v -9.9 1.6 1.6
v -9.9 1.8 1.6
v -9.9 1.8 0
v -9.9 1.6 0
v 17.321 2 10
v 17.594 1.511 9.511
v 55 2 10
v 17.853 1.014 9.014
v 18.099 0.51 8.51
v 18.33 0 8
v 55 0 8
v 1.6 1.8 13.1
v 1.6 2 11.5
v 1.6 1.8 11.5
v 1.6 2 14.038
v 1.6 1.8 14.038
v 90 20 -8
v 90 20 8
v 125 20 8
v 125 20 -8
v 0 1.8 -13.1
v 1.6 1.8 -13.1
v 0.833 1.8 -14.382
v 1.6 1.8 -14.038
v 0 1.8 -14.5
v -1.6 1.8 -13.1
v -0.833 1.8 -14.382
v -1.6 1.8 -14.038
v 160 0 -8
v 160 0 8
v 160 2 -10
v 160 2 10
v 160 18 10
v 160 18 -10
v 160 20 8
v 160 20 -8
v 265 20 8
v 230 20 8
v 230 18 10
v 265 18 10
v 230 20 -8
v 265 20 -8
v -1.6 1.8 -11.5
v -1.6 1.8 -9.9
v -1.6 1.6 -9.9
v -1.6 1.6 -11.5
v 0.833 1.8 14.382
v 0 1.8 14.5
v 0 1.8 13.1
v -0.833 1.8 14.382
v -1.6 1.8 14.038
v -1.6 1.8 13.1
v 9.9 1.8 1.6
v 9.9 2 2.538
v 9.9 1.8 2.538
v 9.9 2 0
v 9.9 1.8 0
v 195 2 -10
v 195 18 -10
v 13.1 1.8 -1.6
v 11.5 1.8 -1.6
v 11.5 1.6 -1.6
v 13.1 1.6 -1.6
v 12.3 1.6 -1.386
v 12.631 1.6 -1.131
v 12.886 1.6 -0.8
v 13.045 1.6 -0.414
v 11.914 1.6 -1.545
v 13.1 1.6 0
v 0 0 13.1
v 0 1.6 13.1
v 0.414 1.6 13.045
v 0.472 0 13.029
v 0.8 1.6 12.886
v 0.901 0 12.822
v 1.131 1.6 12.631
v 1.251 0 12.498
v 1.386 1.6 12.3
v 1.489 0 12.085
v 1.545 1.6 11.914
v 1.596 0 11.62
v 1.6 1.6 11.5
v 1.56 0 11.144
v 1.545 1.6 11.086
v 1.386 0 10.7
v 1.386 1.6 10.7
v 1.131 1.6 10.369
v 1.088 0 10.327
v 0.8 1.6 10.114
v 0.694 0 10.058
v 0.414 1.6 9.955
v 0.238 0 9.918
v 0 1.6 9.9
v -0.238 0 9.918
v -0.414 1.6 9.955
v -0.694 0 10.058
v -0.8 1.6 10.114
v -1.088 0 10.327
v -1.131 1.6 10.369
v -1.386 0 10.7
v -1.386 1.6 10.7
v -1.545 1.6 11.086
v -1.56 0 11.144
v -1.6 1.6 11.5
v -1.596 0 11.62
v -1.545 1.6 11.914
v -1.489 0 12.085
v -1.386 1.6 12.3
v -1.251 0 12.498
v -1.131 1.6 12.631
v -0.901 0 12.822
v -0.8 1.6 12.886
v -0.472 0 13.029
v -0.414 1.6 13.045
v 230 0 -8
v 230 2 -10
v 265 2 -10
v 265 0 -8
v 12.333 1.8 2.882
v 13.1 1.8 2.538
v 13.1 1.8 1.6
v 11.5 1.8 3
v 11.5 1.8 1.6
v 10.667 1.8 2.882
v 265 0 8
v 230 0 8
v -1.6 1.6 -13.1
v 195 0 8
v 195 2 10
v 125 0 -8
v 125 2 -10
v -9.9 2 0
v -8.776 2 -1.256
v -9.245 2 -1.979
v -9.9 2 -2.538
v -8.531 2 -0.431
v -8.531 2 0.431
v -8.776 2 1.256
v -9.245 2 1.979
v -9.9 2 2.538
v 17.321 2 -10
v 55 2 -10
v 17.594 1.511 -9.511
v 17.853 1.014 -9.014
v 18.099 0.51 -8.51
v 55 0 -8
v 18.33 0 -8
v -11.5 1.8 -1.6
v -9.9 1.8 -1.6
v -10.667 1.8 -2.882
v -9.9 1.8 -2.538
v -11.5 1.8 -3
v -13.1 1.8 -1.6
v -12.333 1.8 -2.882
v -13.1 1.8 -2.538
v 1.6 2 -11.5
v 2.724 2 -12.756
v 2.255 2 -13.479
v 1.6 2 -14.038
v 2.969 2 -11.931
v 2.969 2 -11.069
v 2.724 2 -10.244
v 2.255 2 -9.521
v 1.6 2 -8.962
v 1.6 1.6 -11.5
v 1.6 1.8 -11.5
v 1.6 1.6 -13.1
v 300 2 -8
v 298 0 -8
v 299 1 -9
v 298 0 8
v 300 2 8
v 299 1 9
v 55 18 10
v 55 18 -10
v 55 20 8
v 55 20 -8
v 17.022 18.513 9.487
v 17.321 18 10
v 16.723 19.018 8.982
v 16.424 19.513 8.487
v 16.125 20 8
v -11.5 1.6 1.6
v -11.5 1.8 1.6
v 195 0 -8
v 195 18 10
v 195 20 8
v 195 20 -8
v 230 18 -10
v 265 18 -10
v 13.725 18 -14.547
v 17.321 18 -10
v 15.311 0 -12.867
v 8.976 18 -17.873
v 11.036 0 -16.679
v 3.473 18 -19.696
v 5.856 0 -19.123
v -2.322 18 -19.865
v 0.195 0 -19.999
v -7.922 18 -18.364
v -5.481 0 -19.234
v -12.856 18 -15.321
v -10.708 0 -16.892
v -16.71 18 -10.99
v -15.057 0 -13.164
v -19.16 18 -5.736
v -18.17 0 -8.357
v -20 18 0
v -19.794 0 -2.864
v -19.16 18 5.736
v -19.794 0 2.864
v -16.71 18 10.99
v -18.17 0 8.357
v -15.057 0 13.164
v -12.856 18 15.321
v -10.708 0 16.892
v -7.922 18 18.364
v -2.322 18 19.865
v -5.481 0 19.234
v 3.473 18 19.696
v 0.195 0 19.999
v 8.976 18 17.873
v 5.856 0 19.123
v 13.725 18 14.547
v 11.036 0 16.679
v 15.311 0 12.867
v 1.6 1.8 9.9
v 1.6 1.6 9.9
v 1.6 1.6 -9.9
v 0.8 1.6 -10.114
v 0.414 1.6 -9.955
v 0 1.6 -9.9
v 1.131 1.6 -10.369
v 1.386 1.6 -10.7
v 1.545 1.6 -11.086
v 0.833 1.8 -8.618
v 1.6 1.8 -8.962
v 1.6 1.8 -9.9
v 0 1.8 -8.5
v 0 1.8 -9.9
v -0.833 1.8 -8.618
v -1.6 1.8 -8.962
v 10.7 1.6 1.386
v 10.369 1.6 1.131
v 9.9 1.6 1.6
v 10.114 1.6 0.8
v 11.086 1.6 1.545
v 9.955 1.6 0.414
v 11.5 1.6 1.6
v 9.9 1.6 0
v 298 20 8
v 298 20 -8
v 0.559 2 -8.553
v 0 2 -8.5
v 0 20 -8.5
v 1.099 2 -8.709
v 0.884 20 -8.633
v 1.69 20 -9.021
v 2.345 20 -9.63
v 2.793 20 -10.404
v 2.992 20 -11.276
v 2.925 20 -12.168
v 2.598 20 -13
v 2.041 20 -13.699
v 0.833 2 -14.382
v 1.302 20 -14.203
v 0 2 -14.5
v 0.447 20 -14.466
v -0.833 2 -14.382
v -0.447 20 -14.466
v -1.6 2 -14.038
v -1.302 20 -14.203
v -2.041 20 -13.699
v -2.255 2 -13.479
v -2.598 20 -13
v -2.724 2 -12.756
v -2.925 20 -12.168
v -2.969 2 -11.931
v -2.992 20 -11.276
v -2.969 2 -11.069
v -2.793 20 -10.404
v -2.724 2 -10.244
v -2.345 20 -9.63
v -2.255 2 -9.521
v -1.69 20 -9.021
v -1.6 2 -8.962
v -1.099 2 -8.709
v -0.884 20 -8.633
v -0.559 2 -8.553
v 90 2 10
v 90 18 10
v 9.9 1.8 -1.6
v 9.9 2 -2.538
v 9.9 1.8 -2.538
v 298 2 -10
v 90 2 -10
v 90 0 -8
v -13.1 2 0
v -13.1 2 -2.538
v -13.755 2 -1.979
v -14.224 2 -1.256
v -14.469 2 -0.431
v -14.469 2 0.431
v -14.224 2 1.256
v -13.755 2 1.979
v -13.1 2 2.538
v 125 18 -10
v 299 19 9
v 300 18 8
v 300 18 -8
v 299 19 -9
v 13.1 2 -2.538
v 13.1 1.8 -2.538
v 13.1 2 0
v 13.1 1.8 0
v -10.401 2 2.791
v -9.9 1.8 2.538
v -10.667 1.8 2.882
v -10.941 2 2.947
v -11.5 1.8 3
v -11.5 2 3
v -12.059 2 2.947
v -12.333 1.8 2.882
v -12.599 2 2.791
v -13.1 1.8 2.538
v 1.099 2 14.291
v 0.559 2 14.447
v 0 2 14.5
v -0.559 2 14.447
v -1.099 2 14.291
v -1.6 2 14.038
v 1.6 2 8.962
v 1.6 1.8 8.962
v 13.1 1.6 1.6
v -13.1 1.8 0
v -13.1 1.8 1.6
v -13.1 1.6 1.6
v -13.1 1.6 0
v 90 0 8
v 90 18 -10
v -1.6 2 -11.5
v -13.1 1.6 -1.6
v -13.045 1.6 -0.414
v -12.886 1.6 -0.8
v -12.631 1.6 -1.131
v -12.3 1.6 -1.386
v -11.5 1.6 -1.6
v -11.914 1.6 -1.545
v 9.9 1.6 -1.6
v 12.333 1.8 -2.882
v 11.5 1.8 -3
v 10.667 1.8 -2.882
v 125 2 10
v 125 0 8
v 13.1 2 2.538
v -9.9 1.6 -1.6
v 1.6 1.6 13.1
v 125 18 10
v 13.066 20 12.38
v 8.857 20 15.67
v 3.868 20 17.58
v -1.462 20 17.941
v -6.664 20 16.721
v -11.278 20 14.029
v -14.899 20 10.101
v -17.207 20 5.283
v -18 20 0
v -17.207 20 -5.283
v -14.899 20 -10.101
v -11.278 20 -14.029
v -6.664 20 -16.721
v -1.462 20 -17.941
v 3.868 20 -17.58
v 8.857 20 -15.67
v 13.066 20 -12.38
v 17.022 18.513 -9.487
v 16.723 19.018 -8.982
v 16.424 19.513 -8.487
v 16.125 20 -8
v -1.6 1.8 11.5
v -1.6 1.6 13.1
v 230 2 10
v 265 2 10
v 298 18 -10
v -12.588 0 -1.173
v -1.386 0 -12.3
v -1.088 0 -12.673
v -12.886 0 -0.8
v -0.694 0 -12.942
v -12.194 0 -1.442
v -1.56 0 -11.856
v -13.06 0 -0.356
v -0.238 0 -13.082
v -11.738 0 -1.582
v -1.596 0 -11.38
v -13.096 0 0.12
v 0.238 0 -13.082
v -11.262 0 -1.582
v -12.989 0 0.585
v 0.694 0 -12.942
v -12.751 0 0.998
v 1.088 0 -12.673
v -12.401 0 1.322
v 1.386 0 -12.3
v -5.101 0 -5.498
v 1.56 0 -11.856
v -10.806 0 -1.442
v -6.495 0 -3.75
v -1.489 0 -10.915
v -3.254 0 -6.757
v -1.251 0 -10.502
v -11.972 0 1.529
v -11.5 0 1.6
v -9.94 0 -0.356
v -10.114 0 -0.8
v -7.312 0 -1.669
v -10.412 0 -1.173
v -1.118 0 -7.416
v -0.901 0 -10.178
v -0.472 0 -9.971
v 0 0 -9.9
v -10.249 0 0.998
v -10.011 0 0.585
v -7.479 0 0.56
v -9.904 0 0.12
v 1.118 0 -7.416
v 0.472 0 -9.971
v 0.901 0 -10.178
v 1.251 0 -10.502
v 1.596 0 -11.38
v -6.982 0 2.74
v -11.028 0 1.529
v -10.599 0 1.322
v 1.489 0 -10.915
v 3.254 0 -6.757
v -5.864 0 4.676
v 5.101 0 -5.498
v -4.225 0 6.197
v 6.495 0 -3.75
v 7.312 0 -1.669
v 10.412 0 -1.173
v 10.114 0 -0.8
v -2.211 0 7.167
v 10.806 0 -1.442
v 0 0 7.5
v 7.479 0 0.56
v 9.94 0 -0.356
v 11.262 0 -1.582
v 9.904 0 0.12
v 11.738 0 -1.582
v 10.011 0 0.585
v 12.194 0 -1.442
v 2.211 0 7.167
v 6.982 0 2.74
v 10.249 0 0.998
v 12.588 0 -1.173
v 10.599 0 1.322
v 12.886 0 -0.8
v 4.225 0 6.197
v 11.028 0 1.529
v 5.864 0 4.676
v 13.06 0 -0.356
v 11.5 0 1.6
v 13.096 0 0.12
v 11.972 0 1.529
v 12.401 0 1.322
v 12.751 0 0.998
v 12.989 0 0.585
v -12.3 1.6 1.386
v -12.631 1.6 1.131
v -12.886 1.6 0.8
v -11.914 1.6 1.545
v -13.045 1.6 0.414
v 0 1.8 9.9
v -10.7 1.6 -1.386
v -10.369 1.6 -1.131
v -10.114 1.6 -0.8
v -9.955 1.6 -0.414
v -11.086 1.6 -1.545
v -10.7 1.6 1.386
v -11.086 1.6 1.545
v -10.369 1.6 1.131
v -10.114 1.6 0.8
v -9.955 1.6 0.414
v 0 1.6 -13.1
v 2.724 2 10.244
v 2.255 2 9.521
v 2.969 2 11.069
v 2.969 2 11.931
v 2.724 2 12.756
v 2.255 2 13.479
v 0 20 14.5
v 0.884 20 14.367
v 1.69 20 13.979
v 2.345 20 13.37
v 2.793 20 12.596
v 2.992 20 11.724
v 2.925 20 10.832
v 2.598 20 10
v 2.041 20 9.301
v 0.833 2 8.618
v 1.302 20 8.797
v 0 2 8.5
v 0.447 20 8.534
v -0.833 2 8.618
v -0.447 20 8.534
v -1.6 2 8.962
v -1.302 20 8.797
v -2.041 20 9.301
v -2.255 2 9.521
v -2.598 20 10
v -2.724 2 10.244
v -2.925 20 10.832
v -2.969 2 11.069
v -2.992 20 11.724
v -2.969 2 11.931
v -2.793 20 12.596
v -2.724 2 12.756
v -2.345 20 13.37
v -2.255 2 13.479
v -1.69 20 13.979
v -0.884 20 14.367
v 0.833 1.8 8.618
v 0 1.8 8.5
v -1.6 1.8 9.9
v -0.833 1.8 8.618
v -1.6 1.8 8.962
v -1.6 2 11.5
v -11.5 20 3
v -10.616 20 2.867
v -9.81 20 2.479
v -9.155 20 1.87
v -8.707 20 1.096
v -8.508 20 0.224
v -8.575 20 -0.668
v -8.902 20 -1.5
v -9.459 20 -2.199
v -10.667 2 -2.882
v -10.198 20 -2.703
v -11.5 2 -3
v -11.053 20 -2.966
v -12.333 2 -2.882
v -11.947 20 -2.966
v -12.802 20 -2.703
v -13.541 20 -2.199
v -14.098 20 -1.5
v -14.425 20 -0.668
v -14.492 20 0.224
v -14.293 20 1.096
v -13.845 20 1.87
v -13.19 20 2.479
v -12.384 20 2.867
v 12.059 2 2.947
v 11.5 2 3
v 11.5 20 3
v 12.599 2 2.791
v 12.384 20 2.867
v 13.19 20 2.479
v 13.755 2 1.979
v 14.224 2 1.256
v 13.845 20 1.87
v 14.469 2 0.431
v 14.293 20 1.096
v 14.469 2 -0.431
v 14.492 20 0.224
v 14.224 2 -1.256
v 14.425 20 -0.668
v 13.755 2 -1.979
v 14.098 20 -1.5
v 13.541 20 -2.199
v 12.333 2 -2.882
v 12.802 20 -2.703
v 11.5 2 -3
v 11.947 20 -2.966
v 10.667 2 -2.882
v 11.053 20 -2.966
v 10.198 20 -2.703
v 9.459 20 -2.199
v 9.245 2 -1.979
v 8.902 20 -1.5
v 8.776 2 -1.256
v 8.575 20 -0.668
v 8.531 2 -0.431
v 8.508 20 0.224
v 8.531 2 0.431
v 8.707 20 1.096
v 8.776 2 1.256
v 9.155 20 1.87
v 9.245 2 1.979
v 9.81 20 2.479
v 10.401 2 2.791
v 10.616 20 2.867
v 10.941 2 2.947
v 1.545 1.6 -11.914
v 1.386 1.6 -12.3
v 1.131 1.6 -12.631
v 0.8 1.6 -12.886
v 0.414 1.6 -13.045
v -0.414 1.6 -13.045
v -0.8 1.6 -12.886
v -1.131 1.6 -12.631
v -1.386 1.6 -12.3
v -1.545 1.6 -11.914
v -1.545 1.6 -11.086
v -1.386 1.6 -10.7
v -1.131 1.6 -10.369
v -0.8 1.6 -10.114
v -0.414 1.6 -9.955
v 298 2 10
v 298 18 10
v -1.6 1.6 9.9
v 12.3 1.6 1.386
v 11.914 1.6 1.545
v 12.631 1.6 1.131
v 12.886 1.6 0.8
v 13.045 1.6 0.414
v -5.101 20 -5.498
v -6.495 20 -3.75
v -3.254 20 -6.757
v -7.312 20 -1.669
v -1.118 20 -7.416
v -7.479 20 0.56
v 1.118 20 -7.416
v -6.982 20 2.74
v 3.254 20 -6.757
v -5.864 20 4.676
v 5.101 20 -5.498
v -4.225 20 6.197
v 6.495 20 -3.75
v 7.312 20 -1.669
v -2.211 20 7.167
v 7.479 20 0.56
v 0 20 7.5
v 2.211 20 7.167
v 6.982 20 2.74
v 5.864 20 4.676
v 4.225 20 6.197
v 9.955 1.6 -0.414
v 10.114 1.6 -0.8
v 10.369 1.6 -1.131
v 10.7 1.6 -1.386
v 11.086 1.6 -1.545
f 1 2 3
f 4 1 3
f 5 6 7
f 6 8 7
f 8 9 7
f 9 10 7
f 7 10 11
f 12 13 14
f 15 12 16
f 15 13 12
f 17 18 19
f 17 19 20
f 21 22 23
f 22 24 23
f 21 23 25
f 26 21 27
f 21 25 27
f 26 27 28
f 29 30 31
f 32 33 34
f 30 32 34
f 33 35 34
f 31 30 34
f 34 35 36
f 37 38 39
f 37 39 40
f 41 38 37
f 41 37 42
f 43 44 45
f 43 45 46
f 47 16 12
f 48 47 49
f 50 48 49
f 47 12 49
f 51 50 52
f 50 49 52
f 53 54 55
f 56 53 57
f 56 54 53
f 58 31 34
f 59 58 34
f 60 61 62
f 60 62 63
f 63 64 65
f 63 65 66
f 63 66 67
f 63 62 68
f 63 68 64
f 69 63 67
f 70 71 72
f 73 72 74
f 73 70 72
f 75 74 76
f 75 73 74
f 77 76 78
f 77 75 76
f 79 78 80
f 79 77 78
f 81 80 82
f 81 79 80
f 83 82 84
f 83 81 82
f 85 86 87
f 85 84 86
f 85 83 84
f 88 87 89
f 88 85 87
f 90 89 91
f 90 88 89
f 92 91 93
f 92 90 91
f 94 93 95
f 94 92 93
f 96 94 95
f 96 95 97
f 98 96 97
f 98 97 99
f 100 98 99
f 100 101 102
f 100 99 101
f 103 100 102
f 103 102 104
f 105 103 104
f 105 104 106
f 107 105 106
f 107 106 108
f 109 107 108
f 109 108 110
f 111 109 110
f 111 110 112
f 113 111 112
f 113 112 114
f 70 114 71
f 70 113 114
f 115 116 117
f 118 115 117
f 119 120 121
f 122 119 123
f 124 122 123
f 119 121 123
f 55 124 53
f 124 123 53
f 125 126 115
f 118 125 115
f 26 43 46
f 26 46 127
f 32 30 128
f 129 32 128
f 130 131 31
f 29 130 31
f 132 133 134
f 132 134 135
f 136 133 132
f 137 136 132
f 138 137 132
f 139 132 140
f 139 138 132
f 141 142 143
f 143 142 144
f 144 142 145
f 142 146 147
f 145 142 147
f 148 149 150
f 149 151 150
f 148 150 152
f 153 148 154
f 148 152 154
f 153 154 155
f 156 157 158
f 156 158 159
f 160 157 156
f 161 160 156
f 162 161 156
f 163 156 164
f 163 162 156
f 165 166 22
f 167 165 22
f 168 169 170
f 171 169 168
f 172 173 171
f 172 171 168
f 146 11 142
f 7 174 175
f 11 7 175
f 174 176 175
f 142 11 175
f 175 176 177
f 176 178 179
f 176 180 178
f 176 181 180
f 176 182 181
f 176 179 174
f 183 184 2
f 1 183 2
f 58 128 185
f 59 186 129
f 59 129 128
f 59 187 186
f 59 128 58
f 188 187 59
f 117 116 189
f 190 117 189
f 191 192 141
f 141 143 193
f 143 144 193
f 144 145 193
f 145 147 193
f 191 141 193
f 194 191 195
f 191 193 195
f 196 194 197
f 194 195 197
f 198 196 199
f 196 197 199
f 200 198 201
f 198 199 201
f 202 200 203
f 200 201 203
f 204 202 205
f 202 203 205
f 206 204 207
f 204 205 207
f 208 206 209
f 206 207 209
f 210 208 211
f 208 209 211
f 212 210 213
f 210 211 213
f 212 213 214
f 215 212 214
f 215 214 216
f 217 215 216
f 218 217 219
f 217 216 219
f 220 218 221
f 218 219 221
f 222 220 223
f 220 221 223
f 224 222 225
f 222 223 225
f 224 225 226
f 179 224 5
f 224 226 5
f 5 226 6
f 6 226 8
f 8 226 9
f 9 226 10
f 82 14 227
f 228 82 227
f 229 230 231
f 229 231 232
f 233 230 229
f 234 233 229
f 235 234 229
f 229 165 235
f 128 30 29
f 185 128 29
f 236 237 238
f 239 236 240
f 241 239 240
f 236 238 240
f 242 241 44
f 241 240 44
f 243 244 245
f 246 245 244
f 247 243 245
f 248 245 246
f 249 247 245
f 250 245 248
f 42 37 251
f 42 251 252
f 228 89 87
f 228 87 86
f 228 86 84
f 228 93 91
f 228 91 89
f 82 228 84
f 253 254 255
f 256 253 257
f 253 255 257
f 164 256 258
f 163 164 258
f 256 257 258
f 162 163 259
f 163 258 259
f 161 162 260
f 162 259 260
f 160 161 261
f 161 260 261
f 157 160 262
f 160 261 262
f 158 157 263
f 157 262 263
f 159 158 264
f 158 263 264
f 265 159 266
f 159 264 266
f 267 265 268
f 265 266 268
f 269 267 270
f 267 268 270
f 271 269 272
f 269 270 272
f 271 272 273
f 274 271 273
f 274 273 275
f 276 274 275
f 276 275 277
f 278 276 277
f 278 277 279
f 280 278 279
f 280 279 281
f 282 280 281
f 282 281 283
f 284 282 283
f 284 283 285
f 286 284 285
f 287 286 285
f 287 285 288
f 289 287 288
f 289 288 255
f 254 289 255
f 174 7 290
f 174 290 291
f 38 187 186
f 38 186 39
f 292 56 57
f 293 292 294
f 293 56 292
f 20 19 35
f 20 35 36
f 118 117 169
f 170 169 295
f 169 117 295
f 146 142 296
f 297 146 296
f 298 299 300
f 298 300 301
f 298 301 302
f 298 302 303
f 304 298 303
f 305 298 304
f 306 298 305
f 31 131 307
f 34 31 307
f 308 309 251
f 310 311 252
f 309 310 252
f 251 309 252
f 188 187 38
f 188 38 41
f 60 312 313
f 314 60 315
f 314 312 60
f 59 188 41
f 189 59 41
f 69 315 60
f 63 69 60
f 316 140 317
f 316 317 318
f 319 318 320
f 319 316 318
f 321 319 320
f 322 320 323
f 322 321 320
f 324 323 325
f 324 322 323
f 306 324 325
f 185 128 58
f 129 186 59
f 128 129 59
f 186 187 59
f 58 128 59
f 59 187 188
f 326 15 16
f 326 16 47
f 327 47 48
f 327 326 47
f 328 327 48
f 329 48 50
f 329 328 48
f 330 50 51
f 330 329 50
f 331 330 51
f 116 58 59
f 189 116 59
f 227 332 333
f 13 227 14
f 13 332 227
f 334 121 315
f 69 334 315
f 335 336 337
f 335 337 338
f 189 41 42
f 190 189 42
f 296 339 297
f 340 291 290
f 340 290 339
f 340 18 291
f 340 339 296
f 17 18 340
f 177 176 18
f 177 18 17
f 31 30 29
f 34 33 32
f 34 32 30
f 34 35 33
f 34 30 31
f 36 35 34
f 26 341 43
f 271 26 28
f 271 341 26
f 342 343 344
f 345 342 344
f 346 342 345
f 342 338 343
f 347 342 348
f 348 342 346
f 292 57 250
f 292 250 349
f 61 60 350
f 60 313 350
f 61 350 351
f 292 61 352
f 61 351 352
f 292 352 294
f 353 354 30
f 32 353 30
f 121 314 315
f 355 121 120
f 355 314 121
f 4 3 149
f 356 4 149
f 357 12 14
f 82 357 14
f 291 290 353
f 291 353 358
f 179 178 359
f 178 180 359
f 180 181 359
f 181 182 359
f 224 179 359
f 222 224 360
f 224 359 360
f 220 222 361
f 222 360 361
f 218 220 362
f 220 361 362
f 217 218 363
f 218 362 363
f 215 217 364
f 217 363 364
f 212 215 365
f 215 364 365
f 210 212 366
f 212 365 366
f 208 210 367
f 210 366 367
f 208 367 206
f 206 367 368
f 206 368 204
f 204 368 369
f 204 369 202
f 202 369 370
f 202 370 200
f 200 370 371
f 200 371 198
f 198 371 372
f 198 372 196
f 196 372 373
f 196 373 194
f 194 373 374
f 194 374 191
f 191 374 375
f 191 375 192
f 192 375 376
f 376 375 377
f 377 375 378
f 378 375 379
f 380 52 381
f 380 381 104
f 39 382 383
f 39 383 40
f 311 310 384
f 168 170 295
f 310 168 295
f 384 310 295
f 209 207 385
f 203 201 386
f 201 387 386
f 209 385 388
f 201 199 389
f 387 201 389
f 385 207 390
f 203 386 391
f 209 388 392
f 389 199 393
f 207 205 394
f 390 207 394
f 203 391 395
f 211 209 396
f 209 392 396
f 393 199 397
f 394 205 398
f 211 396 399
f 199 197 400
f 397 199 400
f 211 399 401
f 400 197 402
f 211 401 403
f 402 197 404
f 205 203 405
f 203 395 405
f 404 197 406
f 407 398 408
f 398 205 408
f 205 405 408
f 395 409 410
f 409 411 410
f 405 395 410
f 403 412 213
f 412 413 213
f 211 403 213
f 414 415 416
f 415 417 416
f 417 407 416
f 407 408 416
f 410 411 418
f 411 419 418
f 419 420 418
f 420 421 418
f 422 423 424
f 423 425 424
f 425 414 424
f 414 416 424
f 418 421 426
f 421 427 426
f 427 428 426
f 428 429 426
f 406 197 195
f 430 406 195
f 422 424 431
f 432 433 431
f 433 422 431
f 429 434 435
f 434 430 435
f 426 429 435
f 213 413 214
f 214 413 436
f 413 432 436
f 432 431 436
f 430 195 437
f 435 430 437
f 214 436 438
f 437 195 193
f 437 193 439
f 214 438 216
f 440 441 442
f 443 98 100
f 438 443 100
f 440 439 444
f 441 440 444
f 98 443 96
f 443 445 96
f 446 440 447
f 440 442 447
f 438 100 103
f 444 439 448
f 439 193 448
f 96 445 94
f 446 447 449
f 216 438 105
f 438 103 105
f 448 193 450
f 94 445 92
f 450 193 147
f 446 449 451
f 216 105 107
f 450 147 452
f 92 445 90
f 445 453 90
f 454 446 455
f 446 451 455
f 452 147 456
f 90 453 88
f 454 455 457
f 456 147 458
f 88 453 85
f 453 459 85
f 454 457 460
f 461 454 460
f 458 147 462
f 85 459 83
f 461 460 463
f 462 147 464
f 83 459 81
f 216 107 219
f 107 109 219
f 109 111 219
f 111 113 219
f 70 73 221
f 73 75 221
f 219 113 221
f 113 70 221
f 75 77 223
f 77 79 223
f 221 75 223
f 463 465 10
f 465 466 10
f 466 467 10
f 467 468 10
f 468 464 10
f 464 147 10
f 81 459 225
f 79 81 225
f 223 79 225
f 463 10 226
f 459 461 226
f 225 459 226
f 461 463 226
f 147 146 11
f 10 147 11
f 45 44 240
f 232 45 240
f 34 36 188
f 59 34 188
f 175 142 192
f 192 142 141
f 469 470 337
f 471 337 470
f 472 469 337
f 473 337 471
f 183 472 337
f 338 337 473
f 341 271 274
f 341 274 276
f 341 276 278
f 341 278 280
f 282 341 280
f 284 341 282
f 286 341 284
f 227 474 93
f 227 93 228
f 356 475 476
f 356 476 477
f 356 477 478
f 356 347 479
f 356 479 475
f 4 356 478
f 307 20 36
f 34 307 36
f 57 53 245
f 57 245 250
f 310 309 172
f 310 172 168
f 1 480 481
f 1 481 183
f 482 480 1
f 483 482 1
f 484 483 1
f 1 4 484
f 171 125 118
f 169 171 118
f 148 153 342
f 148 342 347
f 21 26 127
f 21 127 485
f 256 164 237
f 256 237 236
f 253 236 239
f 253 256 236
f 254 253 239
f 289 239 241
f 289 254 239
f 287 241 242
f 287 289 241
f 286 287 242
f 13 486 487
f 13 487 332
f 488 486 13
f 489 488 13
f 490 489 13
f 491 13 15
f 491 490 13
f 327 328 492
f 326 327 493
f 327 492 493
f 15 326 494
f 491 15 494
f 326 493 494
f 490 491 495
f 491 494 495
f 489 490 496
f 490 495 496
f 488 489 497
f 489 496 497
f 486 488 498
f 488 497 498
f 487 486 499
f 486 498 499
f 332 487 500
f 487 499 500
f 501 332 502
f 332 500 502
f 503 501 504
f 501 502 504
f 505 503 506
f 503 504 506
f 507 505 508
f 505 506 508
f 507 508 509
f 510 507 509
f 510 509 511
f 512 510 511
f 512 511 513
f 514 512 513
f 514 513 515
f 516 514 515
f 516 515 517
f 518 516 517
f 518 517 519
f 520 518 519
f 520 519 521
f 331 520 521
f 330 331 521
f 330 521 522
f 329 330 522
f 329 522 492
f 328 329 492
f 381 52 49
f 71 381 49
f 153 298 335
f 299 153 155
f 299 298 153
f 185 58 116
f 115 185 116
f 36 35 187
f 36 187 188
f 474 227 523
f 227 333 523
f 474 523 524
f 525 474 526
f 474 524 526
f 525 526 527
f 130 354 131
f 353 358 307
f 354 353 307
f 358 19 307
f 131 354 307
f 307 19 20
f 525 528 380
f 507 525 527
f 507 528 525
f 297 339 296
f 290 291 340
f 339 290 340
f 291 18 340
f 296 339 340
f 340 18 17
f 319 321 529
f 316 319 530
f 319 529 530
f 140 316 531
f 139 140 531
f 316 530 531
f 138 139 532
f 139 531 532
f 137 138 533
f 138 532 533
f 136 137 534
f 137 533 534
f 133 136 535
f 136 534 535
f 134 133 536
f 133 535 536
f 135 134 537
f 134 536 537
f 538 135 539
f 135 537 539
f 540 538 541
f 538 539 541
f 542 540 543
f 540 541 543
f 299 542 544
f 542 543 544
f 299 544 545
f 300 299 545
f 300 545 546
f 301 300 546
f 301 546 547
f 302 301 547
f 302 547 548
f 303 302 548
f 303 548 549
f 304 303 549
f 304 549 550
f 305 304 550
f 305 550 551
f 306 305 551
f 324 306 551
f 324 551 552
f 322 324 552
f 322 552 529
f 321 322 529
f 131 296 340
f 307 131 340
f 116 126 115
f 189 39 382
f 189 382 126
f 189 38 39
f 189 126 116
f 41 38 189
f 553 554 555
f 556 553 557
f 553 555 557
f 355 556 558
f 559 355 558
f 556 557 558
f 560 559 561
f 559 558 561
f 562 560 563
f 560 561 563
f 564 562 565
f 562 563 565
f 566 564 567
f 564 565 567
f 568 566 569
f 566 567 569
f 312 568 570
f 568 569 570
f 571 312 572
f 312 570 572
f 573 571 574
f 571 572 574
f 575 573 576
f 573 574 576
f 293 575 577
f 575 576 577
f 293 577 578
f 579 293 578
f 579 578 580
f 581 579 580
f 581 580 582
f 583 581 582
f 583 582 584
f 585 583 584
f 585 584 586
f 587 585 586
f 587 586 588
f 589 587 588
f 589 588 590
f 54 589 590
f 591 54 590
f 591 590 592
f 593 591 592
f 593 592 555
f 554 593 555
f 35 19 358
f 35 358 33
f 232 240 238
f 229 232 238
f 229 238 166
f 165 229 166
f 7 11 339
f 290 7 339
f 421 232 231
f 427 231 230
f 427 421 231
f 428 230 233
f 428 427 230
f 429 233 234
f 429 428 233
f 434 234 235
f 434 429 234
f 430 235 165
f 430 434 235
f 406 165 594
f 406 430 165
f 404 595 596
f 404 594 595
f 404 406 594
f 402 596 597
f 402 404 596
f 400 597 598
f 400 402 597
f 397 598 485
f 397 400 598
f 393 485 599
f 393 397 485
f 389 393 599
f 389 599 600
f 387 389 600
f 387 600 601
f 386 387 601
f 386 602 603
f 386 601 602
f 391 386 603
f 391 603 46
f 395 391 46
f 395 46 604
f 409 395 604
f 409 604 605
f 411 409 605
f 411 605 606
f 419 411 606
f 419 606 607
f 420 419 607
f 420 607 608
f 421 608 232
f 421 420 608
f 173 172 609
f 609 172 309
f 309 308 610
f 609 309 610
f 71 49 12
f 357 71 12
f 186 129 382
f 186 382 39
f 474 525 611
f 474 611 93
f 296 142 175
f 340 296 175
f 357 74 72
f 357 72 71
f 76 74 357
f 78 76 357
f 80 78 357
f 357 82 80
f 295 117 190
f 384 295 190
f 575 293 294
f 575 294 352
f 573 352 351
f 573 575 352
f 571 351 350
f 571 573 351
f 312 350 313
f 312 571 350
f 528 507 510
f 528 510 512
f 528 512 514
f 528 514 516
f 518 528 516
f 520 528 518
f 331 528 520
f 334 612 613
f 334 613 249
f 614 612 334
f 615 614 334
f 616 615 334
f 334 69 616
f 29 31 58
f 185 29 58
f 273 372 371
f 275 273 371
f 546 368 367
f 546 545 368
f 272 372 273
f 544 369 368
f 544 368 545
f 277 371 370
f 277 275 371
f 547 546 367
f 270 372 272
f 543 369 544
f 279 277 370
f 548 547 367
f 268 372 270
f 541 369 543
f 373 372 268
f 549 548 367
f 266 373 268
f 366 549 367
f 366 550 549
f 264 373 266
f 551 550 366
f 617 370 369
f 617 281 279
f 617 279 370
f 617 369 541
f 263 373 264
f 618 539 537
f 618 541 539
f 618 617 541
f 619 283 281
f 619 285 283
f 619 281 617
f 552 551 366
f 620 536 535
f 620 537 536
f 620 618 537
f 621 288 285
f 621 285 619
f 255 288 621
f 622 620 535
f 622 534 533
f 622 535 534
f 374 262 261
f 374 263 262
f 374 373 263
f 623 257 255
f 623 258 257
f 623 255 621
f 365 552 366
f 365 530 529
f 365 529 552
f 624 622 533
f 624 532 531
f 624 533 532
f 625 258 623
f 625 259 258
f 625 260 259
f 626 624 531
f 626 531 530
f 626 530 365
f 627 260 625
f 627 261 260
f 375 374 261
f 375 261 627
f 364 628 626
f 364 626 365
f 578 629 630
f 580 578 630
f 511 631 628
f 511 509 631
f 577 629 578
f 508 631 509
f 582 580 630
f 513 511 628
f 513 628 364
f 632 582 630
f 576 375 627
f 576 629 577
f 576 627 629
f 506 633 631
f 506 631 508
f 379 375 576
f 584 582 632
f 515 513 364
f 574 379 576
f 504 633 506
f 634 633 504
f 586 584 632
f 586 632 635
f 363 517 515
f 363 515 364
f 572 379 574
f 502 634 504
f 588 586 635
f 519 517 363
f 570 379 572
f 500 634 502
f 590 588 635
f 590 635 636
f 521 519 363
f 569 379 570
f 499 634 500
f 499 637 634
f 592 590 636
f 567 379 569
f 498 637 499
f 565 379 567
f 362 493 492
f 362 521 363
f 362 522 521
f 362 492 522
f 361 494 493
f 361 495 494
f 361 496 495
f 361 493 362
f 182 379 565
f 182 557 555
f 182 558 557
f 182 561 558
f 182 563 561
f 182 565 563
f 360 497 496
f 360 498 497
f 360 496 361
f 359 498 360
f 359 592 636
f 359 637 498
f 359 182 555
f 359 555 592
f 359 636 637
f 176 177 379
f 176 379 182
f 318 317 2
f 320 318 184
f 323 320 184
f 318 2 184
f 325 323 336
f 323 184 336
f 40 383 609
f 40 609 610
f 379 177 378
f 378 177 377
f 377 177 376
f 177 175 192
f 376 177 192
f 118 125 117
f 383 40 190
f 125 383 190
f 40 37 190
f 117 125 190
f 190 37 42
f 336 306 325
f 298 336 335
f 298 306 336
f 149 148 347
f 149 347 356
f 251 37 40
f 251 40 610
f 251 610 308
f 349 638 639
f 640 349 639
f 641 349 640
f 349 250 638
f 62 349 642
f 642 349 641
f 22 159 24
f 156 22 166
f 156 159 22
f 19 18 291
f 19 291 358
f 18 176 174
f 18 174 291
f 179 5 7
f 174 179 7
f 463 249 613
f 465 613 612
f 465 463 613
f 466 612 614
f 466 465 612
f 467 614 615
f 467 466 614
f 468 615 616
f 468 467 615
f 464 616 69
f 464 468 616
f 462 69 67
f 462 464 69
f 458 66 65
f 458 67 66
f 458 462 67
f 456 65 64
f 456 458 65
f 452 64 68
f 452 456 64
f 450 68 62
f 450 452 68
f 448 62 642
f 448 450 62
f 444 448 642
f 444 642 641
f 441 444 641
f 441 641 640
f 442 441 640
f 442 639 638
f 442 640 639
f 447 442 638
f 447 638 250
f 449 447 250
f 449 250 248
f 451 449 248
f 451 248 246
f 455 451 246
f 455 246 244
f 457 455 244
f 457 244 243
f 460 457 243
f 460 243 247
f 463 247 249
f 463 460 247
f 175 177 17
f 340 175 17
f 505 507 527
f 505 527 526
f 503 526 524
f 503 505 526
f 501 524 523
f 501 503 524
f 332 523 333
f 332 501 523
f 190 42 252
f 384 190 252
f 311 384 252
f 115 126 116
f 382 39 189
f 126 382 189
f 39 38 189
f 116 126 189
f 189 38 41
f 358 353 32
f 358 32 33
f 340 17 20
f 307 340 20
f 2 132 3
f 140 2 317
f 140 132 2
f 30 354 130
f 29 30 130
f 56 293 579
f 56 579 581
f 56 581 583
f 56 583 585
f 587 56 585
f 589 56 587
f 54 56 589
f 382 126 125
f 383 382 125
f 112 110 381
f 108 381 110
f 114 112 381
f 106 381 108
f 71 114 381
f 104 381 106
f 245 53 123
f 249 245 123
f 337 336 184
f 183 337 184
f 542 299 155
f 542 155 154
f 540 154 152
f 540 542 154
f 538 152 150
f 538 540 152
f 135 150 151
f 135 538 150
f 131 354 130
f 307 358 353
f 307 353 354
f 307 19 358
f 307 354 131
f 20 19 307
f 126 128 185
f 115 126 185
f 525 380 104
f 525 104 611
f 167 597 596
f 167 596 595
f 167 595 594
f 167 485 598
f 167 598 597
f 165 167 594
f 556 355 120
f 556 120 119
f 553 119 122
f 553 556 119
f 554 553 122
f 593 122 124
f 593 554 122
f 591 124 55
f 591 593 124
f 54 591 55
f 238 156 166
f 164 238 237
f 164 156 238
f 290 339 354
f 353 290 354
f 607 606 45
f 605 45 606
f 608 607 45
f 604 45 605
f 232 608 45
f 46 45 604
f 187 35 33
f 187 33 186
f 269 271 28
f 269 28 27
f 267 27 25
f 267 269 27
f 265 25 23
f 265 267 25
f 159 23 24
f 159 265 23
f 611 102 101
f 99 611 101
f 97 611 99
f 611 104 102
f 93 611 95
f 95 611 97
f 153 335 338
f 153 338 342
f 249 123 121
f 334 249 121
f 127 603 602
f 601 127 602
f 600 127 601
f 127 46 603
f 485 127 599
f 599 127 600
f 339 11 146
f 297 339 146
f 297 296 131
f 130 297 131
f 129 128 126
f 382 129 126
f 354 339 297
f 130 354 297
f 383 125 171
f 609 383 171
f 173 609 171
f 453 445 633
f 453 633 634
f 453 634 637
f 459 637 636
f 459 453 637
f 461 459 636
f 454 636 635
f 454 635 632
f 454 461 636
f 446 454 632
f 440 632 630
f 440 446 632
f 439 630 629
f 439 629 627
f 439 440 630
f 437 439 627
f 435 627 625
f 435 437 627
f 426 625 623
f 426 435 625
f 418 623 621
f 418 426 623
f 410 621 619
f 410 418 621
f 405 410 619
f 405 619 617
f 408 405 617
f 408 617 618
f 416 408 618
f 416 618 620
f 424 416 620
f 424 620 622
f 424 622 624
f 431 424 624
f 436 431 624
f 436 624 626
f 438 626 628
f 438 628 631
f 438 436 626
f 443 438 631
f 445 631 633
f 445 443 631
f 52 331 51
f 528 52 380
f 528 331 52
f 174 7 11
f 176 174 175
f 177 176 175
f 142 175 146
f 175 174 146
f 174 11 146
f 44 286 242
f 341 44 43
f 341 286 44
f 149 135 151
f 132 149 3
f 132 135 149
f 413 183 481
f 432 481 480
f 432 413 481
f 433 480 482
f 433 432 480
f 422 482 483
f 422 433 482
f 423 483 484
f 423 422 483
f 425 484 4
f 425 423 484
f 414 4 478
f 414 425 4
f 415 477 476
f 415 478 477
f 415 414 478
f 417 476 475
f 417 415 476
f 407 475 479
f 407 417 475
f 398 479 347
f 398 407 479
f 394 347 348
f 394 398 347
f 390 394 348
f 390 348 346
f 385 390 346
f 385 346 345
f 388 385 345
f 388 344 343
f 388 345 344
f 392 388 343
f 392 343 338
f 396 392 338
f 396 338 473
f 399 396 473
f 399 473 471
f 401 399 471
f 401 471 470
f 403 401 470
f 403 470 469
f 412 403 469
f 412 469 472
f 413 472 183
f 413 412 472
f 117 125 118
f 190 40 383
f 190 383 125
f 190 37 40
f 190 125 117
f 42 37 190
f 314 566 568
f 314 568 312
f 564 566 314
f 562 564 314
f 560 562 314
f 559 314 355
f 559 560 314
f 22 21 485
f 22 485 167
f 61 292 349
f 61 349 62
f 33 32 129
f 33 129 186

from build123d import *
from build123d.topology import SkipClean

# Parameters (mm, degrees)
SKETCH1_R           = 20
SKETCH1_R_2         = 7.5
SKETCH1_R_3         = 1.6
BOSS_EXTRUDE1_DEPTH = 20
SKETCH2_R           = 3
CUT_EXTRUDE2_DEPTH  = 18
BOSS_EXTRUDE2_START = -20
BOSS_EXTRUDE2_DEPTH = 20
SKETCH4_W           = 20
SKETCH4_H           = 20
BOSS_EXTRUDE3_DEPTH = 35
LPATTERN1_COUNT     = 7
LPATTERN1_PITCH     = 35
CHAMFER2_SIZE       = 2
CHAMFER3_SIZE       = 2
CHAMFER4_SIZE       = 2
CHAMFER5_SIZE       = 2
CHAMFER6_SIZE       = 2
CHAMFER7_SIZE       = 2
CHAMFER8_SIZE       = 2
CHAMFER9_SIZE       = 2
CHAMFER10_SIZE      = 2
CUT_EXTRUDE3_DEPTH  = 0.2
SKETCH6_W           = 3.2
SKETCH6_H           = 3.2
CUT_EXTRUDE4_DEPTH  = 0.2


with BuildPart() as part:
    # Sketch1 → Boss-Extrude1 (new body)
    with BuildSketch(Plane(origin=(0, 0, 0), x_dir=(1, 0, 0), z_dir=(0, 1, 0))):
        with Locations(Location((0, 0, 0), (0, 0, 270))):
            Circle(SKETCH1_R)
        with Locations(Location((0, 0, 0), (0, 0, 270))):
            Circle(SKETCH1_R_2, mode=Mode.SUBTRACT)
        with Locations(Location((0, 11.5, 0), (0, 0, 270))):
            Circle(SKETCH1_R_3, mode=Mode.SUBTRACT)
        with Locations(Location((11.5, 0, 0), (0, 0, 270))):
            Circle(SKETCH1_R_3, mode=Mode.SUBTRACT)
        with Locations(Location((0, -11.5, 0), (0, 0, 270))):
            Circle(SKETCH1_R_3, mode=Mode.SUBTRACT)
        with Locations(Location((-11.5, 0, 0), (0, 0, 270))):
            Circle(SKETCH1_R_3, mode=Mode.SUBTRACT)
    extrude(amount=BOSS_EXTRUDE1_DEPTH)

    # Sketch2 → Cut-Extrude2 (cut)
    with BuildSketch(Plane(origin=(0, 20, 0), x_dir=(1, 0, 0), z_dir=(0, 1, 0))):
        with Locations(Location((0, 11.5, 0), (0, 0, 270))):
            Circle(SKETCH2_R)
        with Locations(Location((11.5, 0, 0), (0, 0, 270))):
            Circle(SKETCH2_R)
        with Locations(Location((0, -11.5, 0), (0, 0, 270))):
            Circle(SKETCH2_R)
        with Locations(Location((-11.5, 0, 0), (0, 0, 270))):
            Circle(SKETCH2_R)
    extrude(amount=-CUT_EXTRUDE2_DEPTH, mode=Mode.SUBTRACT)

    # Sketch3 → Boss-Extrude2 (add)
    with BuildSketch(Plane(origin=(0, 20, 0), x_dir=(1, 0, 0), z_dir=(0, 1, 0)).offset(BOSS_EXTRUDE2_START)):
        with BuildLine():
            Line((55, -10), (55, 10))
            Line((55, 10), (17.320508076, 10))
            ThreePointArc((17.320508076, 10), (20, 0), (17.320508076, -10))
            Line((17.320508076, -10), (55, -10))
        make_face()
    extrude(amount=BOSS_EXTRUDE2_DEPTH)

    # Chamfer9
    chamfer9_edges = [part.edges().sort_by_distance(p)[0] for p in [
        (-20, 20, 0),
        (36.160254038, 20, -10),
        (36.160254038, 20, 10),
        (36.160254038, 0, -10),
        (36.160254038, 0, 10),
    ]]
    chamfer(chamfer9_edges, length=CHAMFER9_SIZE)

    # Sketch5 → Cut-Extrude3 (cut)
    with SkipClean():  # the faces are left unmerged after this step: merging them gives an invalid solid
        with BuildSketch(Plane(origin=(0, 2, 0), x_dir=(1, 0, 0), z_dir=(0, 1, 0))):
            with BuildLine():
                Line((-1.6, 8.962284492), (-1.6, 14.037715508))
                ThreePointArc((-1.6, 14.037715508), (0, 14.5), (1.6, 14.037715508))
                Line((1.6, 14.037715508), (1.6, 8.962284492))
                ThreePointArc((1.6, 8.962284492), (0, 8.5), (-1.6, 8.962284492))
            make_face()
            with BuildLine():
                Line((9.9, -2.537715508), (9.9, 2.537715508))
                ThreePointArc((9.9, 2.537715508), (11.5, 3), (13.1, 2.537715508))
                Line((13.1, 2.537715508), (13.1, -2.537715508))
                ThreePointArc((13.1, -2.537715508), (11.5, -3), (9.9, -2.537715508))
            make_face()
            with BuildLine():
                Line((-1.6, -14.037715508), (-1.6, -8.962284492))
                ThreePointArc((-1.6, -8.962284492), (0, -8.5), (1.6, -8.962284492))
                Line((1.6, -8.962284492), (1.6, -14.037715508))
                ThreePointArc((1.6, -14.037715508), (0, -14.5), (-1.6, -14.037715508))
            make_face()
            with BuildLine():
                Line((-13.1, -2.537715508), (-13.1, 2.537715508))
                ThreePointArc((-13.1, 2.537715508), (-11.5, 3), (-9.9, 2.537715508))
                Line((-9.9, 2.537715508), (-9.9, -2.537715508))
                ThreePointArc((-9.9, -2.537715508), (-11.5, -3), (-13.1, -2.537715508))
            make_face()
        extrude(amount=-CUT_EXTRUDE3_DEPTH, mode=Mode.SUBTRACT)

    # Sketch6 → Cut-Extrude4 (cut)
    with SkipClean():  # the faces are left unmerged after this step: merging them gives an invalid solid
        with BuildSketch(Plane(origin=(0, 1.8, 0), x_dir=(1, 0, 0), z_dir=(0, 1, 0))):
            with Locations((0, 11.5)):
                Rectangle(SKETCH6_W, SKETCH6_H)
            with Locations((11.5, 0)):
                Rectangle(SKETCH6_W, SKETCH6_H)
            with Locations((0, -11.5)):
                Rectangle(SKETCH6_W, SKETCH6_H)
            with Locations((-11.5, 0)):
                Rectangle(SKETCH6_W, SKETCH6_H)
        extrude(amount=-CUT_EXTRUDE4_DEPTH, mode=Mode.SUBTRACT)


with BuildPart() as body_2:
    # Sketch4 → Boss-Extrude3 (new body)
    with BuildSketch(Plane(origin=(55, 0, 0), x_dir=(0, 0, -1), z_dir=(1, 0, 0))):
        with Locations((0, 10)):
            Rectangle(SKETCH4_W, SKETCH4_H)
    boss_extrude3 = extrude(amount=BOSS_EXTRUDE3_DEPTH)

    # Chamfer2
    chamfer2_edges = [body_2.edges().sort_by_distance(p)[0] for p in [
        (72.5, 20, 10),
        (72.5, 20, -10),
        (72.5, 0, -10),
        (72.5, 0, 10),
    ]]
    chamfer(chamfer2_edges, length=CHAMFER2_SIZE)


with BuildPart() as lpattern1_1:
    # LPattern1: pattern copy
    add(boss_extrude3.moved(Location(Vector(1, 0, 0) * (1 * LPATTERN1_PITCH))))

    # Chamfer3
    chamfer3_edges = [lpattern1_1.edges().sort_by_distance(p)[0] for p in [
        (107.5, 20, 10),
        (107.5, 20, -10),
        (107.5, 0, -10),
        (107.5, 0, 10),
    ]]
    chamfer(chamfer3_edges, length=CHAMFER3_SIZE)


with BuildPart() as lpattern1_2:
    # LPattern1: pattern copy
    add(boss_extrude3.moved(Location(Vector(1, 0, 0) * (2 * LPATTERN1_PITCH))))

    # Chamfer4
    chamfer4_edges = [lpattern1_2.edges().sort_by_distance(p)[0] for p in [
        (142.5, 20, 10),
        (142.5, 20, -10),
        (142.5, 0, -10),
        (142.5, 0, 10),
    ]]
    chamfer(chamfer4_edges, length=CHAMFER4_SIZE)


with BuildPart() as lpattern1_3:
    # LPattern1: pattern copy
    add(boss_extrude3.moved(Location(Vector(1, 0, 0) * (3 * LPATTERN1_PITCH))))

    # Chamfer5
    chamfer5_edges = [lpattern1_3.edges().sort_by_distance(p)[0] for p in [
        (177.5, 20, 10),
        (177.5, 20, -10),
        (177.5, 0, -10),
        (177.5, 0, 10),
    ]]
    chamfer(chamfer5_edges, length=CHAMFER5_SIZE)


with BuildPart() as lpattern1_4:
    # LPattern1: pattern copy
    add(boss_extrude3.moved(Location(Vector(1, 0, 0) * (4 * LPATTERN1_PITCH))))

    # Chamfer6
    chamfer6_edges = [lpattern1_4.edges().sort_by_distance(p)[0] for p in [
        (212.5, 20, 10),
        (212.5, 20, -10),
        (212.5, 0, -10),
        (212.5, 0, 10),
    ]]
    chamfer(chamfer6_edges, length=CHAMFER6_SIZE)


with BuildPart() as lpattern1_5:
    # LPattern1: pattern copy
    add(boss_extrude3.moved(Location(Vector(1, 0, 0) * (5 * LPATTERN1_PITCH))))

    # Chamfer7
    chamfer7_edges = [lpattern1_5.edges().sort_by_distance(p)[0] for p in [
        (247.5, 20, 10),
        (247.5, 20, -10),
        (247.5, 0, -10),
        (247.5, 0, 10),
    ]]
    chamfer(chamfer7_edges, length=CHAMFER7_SIZE)


with BuildPart() as lpattern1_6:
    # LPattern1: pattern copy
    add(boss_extrude3.moved(Location(Vector(1, 0, 0) * (6 * LPATTERN1_PITCH))))

    # Chamfer8
    chamfer8_edges = [lpattern1_6.edges().sort_by_distance(p)[0] for p in [
        (282.5, 20, 10),
        (282.5, 20, -10),
        (282.5, 0, -10),
        (282.5, 0, 10),
    ]]
    chamfer(chamfer8_edges, length=CHAMFER8_SIZE)

    # Chamfer10
    # the kernel refuses this chamfer: 2 mm, written as the material it takes off along each edge
    with BuildSketch(Plane(origin=(300, 23.143365976, 10), x_dir=(0.02749587661058217, 0, -0.9996219169112968), z_dir=(0, -1, 0)), Plane(origin=(300, -3.143365976, -10), x_dir=(0.02749587661058217, 0, 0.9996219169112968), z_dir=(0, 1, 0)), Plane(origin=(300, 20, -13.143365976), x_dir=(0.0274958766105822, -0.999621916911297, 0), z_dir=(0, 0, 1))) as chamfer10_piece_1:
        Polygon((CHAMFER10_SIZE * 0.999621916911, -CHAMFER10_SIZE * 0.0274958766106), (-CHAMFER10_SIZE * 0.0274958766106, -CHAMFER10_SIZE * 0.999621916911), (0, 0), align=None)
    extrude(amount=26.286731952, mode=Mode.SUBTRACT)
    with BuildSketch(Plane(origin=(300, 0, 13.143365976), x_dir=(-0.9996219169112968, -0.027495876610586483, 0), z_dir=(0, 0, -1))) as chamfer10_piece_2:
        Polygon((CHAMFER10_SIZE * 0.999621916911, CHAMFER10_SIZE * 0.0274958766106), (-CHAMFER10_SIZE * 0.0274958766106, CHAMFER10_SIZE * 0.999621916911), (0, 0), align=None)
    extrude(amount=26.286731952, mode=Mode.SUBTRACT)


solid = Compound([part.part, body_2.part, lpattern1_1.part, lpattern1_2.part, lpattern1_3.part, lpattern1_4.part, lpattern1_5.part, lpattern1_6.part])
